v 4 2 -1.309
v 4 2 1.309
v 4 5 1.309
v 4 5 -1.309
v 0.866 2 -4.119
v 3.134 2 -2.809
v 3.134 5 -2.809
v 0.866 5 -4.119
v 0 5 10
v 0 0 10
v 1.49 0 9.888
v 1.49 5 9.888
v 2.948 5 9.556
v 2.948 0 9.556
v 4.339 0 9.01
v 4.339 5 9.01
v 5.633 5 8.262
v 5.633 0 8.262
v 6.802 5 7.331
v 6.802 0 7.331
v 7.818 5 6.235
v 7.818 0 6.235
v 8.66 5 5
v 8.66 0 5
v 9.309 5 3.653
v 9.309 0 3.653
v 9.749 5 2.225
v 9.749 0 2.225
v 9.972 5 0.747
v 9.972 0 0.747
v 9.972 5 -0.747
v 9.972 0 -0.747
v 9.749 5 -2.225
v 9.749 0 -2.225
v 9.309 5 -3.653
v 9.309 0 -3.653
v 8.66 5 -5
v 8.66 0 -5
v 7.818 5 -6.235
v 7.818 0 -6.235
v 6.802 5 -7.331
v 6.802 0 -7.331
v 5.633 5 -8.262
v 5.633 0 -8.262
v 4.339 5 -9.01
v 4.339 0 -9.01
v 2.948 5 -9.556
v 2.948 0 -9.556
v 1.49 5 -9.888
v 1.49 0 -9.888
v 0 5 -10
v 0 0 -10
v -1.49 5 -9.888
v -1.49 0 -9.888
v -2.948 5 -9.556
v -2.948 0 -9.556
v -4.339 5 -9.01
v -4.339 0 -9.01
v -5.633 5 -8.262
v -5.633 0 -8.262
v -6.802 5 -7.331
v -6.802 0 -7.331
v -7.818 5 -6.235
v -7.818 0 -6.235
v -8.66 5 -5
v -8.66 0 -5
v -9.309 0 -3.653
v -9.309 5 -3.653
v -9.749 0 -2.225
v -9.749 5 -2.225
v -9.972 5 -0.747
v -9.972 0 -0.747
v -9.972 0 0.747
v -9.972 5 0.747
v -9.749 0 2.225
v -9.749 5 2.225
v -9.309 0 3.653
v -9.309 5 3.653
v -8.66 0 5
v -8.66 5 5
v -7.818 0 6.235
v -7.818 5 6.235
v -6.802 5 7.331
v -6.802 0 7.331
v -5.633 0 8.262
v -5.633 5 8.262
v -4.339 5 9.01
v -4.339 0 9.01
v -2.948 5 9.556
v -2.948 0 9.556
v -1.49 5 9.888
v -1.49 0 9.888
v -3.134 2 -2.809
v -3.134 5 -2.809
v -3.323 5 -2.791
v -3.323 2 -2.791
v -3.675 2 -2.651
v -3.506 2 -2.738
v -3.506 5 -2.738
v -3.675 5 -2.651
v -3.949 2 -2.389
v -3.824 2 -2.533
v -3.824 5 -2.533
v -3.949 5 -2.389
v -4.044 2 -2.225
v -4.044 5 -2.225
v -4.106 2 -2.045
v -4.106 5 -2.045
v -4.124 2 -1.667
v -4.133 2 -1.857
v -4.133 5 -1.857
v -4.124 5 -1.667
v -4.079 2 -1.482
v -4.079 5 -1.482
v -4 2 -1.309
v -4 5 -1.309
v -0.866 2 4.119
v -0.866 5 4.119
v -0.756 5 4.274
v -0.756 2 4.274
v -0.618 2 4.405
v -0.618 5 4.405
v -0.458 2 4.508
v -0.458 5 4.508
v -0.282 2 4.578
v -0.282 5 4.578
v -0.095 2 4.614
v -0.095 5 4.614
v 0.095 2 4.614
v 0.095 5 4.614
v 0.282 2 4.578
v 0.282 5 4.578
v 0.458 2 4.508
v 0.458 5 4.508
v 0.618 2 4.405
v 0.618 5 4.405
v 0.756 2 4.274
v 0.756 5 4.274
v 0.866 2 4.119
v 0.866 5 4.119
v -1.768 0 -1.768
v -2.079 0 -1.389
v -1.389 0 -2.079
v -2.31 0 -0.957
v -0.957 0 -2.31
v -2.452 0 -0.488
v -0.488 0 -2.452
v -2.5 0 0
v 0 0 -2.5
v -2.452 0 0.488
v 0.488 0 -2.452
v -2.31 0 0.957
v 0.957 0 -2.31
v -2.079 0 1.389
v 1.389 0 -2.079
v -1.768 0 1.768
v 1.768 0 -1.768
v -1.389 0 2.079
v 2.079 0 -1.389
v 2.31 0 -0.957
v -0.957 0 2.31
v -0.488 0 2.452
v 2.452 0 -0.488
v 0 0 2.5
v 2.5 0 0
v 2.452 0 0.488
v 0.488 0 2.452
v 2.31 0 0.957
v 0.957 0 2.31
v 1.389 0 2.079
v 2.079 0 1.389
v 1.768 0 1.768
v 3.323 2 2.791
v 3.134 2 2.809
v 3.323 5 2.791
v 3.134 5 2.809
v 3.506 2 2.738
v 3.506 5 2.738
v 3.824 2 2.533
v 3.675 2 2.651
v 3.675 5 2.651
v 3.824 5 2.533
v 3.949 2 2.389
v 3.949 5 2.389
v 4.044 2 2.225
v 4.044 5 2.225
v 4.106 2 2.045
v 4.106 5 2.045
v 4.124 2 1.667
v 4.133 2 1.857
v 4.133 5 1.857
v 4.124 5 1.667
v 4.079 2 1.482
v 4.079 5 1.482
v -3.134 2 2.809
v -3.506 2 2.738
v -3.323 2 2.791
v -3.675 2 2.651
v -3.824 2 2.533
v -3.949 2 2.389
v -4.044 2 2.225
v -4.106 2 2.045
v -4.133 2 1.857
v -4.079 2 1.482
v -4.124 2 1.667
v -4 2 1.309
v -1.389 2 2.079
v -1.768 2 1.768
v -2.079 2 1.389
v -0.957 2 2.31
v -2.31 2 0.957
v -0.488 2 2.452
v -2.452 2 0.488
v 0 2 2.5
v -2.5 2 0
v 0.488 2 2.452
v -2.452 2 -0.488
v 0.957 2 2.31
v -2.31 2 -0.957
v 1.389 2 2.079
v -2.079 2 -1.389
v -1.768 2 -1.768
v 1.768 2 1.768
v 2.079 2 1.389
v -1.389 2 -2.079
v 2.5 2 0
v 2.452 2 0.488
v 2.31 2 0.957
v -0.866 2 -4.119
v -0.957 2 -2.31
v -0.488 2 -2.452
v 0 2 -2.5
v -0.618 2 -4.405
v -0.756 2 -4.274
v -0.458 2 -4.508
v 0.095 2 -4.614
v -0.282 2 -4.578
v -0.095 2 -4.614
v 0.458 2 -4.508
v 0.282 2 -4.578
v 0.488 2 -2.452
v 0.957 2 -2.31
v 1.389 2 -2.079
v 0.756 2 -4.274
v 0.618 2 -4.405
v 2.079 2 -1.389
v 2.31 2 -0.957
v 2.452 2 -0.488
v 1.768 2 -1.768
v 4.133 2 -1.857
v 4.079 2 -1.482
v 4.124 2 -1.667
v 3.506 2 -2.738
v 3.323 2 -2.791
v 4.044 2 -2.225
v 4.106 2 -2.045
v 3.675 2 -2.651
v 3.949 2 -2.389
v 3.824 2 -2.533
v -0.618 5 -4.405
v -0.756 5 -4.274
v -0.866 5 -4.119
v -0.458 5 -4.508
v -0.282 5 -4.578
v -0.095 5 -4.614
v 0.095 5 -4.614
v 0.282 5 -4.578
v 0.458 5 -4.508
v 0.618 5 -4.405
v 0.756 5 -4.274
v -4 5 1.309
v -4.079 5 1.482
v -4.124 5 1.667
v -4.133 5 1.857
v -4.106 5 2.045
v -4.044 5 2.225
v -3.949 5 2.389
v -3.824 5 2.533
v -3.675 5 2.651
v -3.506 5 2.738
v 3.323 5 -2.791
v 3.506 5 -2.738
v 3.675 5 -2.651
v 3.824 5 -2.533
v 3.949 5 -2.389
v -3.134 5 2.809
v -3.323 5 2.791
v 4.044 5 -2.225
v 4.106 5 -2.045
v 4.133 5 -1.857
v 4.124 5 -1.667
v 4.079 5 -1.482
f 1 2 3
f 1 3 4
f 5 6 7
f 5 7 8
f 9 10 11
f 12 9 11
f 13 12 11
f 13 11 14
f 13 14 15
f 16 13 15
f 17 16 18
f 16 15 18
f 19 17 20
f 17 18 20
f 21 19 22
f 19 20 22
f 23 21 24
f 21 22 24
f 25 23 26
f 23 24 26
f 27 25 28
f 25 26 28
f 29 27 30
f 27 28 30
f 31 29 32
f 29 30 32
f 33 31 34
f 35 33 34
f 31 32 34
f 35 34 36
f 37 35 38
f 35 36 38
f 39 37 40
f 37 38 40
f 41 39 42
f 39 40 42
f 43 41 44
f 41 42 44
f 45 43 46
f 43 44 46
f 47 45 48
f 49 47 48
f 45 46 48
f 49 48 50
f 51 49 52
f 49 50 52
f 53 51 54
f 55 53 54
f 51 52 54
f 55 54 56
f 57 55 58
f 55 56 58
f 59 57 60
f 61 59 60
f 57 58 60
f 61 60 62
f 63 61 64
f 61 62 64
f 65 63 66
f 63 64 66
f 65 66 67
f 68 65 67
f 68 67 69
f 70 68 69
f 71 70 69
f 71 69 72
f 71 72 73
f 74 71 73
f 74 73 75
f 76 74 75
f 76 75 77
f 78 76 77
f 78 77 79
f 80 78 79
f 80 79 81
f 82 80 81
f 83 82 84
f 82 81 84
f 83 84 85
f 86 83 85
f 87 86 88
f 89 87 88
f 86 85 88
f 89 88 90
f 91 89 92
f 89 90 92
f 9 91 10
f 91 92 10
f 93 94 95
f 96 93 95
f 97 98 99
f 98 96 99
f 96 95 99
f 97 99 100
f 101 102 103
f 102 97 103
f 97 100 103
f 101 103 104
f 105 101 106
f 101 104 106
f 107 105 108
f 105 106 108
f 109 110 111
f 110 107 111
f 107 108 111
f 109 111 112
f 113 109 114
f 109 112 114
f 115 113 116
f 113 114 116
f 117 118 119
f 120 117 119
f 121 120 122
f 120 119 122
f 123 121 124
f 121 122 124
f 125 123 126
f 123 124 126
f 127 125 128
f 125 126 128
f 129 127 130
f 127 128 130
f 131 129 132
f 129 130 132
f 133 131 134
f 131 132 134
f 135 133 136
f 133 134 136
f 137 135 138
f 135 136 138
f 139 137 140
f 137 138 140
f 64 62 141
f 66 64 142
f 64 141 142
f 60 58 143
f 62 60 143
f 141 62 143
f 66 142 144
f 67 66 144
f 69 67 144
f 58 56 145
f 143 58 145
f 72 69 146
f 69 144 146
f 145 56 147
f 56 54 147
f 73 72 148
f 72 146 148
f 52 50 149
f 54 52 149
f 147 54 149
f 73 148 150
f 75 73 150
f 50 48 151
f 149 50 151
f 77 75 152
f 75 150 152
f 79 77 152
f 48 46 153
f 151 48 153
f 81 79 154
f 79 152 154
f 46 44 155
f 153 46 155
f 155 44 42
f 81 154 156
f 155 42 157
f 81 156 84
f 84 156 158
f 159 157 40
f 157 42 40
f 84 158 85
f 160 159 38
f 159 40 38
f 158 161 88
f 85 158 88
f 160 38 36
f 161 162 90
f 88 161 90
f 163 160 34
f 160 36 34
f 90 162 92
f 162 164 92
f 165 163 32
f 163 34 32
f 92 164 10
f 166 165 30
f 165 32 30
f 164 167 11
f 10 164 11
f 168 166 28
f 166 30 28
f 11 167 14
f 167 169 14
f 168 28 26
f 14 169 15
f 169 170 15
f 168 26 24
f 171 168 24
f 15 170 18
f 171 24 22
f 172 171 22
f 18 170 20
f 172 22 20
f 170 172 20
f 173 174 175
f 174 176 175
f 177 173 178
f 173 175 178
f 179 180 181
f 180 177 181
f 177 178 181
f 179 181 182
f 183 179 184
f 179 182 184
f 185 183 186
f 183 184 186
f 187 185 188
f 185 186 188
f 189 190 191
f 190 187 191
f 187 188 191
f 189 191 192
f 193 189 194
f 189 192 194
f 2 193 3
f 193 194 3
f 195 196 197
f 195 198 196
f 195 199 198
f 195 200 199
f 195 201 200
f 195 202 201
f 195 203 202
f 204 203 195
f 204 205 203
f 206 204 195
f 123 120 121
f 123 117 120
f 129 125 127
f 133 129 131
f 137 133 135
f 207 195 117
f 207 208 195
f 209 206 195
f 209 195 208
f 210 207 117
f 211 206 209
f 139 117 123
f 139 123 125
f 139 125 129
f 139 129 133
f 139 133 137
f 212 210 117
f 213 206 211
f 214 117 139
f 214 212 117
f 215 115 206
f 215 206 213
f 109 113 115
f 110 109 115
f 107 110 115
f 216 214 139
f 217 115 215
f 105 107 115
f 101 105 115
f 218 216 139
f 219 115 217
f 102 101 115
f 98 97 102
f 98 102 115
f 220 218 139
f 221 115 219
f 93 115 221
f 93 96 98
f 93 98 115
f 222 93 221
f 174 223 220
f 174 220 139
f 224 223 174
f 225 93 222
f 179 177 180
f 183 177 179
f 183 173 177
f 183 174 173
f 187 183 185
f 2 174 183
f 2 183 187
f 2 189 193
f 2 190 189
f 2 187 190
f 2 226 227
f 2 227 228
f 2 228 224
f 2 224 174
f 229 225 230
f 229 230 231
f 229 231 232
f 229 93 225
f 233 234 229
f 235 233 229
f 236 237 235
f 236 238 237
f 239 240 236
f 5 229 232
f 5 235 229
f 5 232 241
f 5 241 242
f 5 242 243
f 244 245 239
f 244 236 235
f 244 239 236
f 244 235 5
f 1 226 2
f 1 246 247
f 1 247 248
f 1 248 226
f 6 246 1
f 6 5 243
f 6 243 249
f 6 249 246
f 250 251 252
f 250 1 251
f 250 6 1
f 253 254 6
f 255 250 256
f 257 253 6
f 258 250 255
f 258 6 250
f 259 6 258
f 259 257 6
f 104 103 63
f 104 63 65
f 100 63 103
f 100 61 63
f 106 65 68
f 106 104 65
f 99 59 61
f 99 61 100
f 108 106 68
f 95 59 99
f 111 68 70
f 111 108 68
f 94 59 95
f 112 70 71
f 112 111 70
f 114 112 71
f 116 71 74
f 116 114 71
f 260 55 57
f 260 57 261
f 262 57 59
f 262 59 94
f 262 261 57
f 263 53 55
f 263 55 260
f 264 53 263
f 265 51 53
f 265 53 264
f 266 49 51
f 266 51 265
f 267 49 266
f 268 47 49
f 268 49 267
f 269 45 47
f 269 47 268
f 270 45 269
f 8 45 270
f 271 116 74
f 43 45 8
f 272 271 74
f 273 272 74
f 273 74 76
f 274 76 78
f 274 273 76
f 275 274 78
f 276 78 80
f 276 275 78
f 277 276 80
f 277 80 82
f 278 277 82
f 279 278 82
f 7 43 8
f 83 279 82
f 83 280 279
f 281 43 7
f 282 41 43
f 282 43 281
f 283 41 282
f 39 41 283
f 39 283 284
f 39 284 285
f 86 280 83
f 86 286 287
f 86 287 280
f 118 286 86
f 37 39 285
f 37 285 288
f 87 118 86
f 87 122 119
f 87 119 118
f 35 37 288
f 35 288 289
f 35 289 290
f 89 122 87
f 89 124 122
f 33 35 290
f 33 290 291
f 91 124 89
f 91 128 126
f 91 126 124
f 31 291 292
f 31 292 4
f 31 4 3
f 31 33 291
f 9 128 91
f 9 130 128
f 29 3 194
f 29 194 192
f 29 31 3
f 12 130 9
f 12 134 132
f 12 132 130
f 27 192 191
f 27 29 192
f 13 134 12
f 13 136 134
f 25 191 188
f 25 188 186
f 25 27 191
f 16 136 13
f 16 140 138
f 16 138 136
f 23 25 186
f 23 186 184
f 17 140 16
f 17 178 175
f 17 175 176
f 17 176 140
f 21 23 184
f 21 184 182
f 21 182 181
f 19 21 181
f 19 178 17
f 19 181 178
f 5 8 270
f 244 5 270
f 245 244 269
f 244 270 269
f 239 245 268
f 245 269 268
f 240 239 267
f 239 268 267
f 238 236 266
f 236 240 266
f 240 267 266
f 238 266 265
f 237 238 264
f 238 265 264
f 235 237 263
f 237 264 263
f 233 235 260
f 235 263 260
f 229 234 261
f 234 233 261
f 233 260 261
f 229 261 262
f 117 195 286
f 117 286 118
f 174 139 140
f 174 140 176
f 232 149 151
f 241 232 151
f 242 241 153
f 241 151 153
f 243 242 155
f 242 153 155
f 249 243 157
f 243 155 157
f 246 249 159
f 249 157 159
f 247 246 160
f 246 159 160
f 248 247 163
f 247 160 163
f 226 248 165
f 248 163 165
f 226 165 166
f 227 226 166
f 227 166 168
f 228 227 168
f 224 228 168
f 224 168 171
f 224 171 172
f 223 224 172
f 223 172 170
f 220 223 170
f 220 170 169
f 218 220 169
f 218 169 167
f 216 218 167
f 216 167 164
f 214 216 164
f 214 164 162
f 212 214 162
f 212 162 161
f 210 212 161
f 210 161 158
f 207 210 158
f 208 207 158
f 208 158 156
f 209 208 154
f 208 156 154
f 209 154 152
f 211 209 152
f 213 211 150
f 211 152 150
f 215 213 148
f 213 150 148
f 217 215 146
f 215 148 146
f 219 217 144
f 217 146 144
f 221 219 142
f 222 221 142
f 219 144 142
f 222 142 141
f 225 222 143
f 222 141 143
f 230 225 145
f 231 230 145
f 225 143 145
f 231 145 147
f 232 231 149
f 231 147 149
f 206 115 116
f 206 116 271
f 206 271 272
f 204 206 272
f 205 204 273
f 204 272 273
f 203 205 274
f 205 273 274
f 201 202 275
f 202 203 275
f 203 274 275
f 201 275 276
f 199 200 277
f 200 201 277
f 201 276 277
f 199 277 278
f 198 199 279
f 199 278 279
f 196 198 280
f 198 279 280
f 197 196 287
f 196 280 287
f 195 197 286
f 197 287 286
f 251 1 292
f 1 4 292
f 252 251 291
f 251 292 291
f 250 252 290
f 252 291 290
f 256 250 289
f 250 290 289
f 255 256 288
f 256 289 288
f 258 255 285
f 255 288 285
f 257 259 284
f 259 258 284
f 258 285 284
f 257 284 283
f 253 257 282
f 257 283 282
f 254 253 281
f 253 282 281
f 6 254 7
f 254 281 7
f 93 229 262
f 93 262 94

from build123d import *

# Parameters (mm, degrees)
SKETCH_1_R          = 10
EXTRUDE_1_DEPTH     = 5
CUT_EXTRUDE_1_DEPTH = 3
SKETCH_3_R          = 1
CUT_EXTRUDE_2_DEPTH = 3
SKETCH_5_R          = 2.5
CUT_EXTRUDE_3_DEPTH = 3


with BuildPart() as part:
    # 스케치1 → 보스-돌출1 (new body)
    with BuildSketch(Plane(origin=(0, 0, 0), x_dir=(1, 0, 0), z_dir=(0, 1, 0))):
        with Locations(Location((0, 0, 0), (0, 0, 270))):
            Circle(SKETCH_1_R)
    extrude(amount=EXTRUDE_1_DEPTH)

    # 스케치2 → 컷-돌출1 (cut)
    with BuildSketch(Plane(origin=(0, 5, 0), x_dir=(1, 0, 0), z_dir=(0, 1, 0))):
        Polygon((0, 4.618802154), (-4, 2.309401077), (-4, -2.309401077), (0, -4.618802154), (4, -2.309401077), (4, 2.309401077), align=None)
    extrude(amount=-CUT_EXTRUDE_1_DEPTH, mode=Mode.SUBTRACT)

    # 스케치3 → 컷-돌출2 (cut)
    with BuildSketch(Plane(origin=(0, 5, 0), x_dir=(1, 0, 0), z_dir=(0, 1, 0))):
        with Locations((0, 3.618802154)):
            Circle(SKETCH_3_R)
        with Locations((3.133974596, 1.809401077)):
            Circle(SKETCH_3_R)
        with Locations((3.133974596, -1.809401077)):
            Circle(SKETCH_3_R)
        with Locations((0, -3.618802154)):
            Circle(SKETCH_3_R)
        with Locations((-3.133974596, -1.809401077)):
            Circle(SKETCH_3_R)
        with Locations((-3.133974596, 1.809401077)):
            Circle(SKETCH_3_R)
    extrude(amount=-CUT_EXTRUDE_2_DEPTH, mode=Mode.SUBTRACT)

    # 스케치5 → 컷-돌출3 (cut)
    with BuildSketch(Plane.XZ):
        with Locations(Location((0, 0, 0), (0, 0, 270))):
            Circle(SKETCH_5_R)
    extrude(amount=-CUT_EXTRUDE_3_DEPTH, mode=Mode.SUBTRACT)


solid = part.part
